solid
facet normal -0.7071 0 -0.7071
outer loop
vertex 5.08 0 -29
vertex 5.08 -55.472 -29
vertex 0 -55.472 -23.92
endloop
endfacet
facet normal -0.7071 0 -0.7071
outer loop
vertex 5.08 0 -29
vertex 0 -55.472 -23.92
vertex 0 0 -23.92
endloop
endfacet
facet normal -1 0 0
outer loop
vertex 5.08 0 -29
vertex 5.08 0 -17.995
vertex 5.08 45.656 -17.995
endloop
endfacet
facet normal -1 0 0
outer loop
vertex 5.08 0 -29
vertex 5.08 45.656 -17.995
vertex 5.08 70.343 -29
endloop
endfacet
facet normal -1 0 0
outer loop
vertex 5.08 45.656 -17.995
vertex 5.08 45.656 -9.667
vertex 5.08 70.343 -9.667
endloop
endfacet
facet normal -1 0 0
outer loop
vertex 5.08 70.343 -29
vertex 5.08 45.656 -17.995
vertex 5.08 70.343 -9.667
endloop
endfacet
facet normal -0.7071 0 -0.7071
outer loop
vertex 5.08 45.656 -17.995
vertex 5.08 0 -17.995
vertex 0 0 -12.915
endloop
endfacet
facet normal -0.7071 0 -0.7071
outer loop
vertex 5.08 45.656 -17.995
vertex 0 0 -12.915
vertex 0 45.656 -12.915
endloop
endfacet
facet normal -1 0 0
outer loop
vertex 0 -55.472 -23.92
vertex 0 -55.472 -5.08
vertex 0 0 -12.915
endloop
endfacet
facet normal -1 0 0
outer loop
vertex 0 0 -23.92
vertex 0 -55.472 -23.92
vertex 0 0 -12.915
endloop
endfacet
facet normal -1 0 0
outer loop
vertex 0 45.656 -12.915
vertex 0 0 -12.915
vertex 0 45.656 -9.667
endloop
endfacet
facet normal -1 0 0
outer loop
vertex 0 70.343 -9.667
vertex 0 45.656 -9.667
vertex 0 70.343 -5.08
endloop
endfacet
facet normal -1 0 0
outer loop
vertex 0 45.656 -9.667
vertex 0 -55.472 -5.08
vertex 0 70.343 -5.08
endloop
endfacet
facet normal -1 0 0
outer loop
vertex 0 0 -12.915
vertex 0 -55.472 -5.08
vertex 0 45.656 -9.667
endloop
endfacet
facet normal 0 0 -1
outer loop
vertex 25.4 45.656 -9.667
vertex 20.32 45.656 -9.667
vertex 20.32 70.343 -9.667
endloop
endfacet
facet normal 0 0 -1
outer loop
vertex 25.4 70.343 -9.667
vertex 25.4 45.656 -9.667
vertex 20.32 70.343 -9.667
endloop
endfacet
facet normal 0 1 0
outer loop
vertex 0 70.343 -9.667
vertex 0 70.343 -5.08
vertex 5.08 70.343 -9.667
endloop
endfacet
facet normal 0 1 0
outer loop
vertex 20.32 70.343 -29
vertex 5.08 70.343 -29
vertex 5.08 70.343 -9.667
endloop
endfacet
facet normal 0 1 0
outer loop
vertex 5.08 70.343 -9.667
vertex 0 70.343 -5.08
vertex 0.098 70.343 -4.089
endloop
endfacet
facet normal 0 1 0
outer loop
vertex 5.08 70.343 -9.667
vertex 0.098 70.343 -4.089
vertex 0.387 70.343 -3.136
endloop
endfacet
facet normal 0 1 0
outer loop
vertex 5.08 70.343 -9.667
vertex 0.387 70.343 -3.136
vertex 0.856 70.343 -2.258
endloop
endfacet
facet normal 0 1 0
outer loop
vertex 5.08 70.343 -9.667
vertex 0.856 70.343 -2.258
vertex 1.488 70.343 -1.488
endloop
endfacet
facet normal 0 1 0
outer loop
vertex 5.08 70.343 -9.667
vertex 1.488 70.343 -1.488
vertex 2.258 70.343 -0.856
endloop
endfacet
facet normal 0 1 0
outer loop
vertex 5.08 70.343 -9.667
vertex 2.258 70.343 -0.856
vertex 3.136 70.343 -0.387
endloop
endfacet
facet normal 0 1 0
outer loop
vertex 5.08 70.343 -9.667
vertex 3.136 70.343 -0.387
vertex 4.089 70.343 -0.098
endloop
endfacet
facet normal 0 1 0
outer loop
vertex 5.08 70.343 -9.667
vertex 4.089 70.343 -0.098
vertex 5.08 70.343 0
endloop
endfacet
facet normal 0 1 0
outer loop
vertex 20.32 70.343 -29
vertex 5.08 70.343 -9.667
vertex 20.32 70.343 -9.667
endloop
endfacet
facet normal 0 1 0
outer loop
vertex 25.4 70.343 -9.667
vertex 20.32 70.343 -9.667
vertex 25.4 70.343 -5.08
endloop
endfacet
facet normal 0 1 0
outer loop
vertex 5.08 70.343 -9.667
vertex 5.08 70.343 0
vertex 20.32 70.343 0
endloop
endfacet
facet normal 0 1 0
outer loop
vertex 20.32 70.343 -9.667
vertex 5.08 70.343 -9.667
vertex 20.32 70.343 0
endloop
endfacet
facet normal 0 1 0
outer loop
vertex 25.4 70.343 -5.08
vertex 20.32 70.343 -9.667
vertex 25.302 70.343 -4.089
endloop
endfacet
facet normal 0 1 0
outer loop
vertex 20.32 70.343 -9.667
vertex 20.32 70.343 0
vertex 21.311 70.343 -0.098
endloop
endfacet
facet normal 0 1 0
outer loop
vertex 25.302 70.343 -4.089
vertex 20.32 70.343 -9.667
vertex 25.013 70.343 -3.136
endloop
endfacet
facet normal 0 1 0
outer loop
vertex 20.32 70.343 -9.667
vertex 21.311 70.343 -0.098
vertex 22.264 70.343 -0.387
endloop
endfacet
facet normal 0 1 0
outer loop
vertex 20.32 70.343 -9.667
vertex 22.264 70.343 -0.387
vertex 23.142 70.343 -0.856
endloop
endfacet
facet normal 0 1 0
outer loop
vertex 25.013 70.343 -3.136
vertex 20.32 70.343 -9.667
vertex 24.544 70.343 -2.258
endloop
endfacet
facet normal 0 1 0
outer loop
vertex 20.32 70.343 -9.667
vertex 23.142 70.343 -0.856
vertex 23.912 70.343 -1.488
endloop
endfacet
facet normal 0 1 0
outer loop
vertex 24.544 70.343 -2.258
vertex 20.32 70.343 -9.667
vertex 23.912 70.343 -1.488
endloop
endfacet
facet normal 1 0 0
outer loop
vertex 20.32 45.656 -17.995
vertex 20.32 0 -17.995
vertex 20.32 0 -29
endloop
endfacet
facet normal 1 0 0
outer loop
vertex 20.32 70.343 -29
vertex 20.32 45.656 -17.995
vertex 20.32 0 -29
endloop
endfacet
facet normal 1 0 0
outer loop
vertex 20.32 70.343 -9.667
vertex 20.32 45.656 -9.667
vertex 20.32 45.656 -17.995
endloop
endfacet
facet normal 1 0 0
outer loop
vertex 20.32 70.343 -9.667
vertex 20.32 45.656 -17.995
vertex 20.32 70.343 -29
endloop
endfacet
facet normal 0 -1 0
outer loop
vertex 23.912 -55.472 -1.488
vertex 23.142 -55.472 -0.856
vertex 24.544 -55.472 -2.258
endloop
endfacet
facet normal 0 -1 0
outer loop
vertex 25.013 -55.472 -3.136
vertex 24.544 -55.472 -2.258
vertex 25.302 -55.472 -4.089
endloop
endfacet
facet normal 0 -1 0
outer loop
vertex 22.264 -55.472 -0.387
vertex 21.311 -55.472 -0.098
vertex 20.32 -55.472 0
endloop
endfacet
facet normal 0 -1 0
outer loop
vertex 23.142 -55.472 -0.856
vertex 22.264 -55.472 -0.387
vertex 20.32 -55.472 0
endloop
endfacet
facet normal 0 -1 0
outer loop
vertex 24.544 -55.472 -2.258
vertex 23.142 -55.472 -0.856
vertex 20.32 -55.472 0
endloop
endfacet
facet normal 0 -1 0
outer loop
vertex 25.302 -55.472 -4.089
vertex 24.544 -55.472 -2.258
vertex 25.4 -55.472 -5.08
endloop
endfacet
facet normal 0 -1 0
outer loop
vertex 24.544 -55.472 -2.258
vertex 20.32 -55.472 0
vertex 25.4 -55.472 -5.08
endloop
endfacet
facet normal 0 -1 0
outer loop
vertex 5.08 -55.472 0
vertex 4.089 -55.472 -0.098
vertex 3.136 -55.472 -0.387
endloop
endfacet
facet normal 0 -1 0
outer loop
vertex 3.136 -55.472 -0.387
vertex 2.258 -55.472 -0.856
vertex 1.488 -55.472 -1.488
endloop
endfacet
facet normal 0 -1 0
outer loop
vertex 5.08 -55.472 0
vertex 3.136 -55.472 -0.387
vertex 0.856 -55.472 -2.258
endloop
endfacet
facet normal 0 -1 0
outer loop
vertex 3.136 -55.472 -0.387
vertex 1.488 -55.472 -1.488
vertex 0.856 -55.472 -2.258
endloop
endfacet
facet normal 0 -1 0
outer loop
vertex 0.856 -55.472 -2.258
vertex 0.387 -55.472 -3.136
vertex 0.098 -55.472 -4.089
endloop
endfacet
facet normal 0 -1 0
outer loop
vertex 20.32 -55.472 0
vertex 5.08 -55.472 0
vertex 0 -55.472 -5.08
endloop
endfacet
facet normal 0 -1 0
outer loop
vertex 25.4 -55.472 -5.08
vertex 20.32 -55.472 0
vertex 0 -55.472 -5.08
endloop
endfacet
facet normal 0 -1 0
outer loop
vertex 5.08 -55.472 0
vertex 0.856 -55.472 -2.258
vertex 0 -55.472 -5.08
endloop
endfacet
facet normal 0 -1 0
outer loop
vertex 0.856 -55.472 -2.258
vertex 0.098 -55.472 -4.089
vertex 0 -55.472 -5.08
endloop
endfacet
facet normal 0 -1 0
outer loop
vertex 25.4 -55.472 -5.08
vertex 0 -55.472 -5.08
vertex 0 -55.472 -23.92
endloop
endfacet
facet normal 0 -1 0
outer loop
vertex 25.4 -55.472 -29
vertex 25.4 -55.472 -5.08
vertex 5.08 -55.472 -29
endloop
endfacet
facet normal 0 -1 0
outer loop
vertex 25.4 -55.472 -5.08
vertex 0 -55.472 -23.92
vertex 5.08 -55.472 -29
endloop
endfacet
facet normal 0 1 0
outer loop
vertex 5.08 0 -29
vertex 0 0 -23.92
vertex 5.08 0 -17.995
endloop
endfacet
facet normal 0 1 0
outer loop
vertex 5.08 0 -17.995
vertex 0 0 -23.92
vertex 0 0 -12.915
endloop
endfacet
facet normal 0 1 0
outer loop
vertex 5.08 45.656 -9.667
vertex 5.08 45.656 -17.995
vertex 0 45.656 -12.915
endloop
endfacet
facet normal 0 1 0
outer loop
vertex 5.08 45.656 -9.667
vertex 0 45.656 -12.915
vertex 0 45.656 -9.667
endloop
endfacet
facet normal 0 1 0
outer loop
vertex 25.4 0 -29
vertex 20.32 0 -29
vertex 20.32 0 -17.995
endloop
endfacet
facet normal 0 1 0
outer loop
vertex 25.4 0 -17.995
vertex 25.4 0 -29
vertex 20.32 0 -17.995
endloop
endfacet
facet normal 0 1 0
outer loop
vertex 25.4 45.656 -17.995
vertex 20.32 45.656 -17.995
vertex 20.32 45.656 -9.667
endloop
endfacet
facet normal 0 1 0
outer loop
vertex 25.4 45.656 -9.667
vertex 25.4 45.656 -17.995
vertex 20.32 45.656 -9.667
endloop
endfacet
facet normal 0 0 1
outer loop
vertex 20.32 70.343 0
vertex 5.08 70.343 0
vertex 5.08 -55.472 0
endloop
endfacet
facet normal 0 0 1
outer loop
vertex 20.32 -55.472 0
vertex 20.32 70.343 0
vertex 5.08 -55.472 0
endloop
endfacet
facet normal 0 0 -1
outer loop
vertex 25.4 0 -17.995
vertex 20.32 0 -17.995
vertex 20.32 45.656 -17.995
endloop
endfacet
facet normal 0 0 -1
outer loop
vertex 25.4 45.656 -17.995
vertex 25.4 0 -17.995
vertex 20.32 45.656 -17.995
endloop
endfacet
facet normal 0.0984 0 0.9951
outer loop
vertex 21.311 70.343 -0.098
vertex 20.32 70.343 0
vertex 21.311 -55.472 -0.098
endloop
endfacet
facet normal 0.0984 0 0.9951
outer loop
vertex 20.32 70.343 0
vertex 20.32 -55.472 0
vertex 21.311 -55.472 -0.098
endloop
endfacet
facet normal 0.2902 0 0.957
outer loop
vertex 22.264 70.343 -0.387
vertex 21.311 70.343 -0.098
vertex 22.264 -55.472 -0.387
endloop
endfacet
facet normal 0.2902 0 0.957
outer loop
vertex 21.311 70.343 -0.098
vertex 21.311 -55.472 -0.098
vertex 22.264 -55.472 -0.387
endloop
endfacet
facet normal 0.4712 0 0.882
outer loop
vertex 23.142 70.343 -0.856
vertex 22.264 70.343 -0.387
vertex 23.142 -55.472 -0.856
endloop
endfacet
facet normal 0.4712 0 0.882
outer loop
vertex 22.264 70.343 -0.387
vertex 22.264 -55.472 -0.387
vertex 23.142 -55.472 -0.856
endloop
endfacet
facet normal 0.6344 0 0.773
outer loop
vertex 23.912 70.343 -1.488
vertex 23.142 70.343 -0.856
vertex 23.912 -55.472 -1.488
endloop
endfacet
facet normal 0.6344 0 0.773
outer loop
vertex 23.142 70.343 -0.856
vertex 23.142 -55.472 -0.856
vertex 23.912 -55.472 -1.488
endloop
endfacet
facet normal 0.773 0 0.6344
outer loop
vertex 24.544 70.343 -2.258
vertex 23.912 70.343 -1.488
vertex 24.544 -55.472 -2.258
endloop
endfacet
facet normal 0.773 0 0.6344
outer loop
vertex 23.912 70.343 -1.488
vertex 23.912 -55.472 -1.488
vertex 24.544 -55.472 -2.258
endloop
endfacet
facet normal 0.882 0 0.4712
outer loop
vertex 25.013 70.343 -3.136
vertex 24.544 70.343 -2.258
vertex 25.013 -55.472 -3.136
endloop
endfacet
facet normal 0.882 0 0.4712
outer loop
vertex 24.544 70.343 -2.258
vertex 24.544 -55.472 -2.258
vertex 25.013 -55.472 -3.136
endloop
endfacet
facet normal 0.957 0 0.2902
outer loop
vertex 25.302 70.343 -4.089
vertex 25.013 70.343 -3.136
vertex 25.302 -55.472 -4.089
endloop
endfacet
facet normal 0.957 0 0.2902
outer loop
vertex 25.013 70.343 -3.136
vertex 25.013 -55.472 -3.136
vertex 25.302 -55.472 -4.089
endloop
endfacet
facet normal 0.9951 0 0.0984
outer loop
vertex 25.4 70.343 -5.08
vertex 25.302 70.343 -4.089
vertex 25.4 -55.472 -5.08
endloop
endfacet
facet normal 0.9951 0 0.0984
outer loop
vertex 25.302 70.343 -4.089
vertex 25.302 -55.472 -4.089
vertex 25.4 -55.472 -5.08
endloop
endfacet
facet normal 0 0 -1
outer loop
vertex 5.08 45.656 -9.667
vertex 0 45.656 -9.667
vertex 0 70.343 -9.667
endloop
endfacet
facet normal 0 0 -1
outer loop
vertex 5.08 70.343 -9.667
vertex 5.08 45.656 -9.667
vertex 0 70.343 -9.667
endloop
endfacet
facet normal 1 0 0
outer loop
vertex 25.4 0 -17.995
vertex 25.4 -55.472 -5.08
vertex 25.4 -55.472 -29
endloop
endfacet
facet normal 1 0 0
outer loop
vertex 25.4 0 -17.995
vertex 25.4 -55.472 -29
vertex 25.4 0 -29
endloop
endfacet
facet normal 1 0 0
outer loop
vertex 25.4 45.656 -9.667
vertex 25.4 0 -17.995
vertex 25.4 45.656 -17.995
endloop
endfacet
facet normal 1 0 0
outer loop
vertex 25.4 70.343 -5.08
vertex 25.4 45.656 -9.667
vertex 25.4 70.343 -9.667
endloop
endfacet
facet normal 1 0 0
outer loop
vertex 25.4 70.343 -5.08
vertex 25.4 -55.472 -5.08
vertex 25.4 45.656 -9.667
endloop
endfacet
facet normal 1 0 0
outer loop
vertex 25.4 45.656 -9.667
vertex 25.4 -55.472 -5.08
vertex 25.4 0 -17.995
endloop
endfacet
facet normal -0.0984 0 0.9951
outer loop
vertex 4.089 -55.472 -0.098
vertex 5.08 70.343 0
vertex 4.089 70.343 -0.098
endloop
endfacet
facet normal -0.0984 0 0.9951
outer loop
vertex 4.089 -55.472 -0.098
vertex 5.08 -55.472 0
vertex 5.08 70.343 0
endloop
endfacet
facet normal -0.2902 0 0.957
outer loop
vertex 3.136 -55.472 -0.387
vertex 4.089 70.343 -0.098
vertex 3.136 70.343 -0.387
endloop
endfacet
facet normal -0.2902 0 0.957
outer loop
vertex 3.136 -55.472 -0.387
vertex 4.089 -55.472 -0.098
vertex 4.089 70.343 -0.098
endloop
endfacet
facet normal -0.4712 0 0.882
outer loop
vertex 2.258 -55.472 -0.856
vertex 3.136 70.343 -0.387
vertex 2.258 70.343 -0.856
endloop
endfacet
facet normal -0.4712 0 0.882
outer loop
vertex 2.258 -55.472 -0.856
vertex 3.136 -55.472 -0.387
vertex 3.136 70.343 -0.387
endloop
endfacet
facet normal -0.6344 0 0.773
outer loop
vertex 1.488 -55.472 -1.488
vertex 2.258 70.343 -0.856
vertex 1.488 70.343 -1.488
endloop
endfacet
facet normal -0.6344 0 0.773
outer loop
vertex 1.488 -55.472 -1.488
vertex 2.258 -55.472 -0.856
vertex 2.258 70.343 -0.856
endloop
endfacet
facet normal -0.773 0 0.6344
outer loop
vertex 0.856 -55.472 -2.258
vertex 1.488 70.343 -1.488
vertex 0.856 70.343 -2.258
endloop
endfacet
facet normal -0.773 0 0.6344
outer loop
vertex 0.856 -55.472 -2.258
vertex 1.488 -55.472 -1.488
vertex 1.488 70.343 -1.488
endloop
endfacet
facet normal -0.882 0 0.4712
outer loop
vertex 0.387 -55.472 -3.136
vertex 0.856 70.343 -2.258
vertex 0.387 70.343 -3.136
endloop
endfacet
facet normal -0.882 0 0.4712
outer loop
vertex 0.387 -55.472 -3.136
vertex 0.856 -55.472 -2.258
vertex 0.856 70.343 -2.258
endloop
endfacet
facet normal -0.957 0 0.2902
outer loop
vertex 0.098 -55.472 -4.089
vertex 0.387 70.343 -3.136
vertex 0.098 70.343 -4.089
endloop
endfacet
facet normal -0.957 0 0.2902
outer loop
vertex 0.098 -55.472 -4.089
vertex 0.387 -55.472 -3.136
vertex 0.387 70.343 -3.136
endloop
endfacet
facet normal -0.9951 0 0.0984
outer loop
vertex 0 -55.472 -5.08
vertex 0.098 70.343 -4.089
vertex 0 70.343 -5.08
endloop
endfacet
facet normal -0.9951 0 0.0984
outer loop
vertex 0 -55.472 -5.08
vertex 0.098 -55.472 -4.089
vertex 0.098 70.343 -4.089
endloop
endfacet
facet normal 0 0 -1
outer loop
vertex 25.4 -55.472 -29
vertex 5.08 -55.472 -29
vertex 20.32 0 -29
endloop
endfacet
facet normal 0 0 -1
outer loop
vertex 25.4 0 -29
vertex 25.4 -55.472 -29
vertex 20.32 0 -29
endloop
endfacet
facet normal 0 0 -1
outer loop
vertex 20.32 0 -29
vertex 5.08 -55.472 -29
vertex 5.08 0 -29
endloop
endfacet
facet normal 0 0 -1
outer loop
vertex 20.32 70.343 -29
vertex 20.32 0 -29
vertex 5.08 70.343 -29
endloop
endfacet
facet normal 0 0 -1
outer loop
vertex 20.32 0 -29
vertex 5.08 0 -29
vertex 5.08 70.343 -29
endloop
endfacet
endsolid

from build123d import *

# Parameters (mm, degrees)
F1_DEPTH  = 25.4
F2_R      = 5.08
F3_R      = 5.08
F4_SIZE   = 5.08
F5_R      = 6.332586
F1_FACE_W = 15.24
F1_FACE_H = 125.814986
F6_DEPTH  = 28.999906


with BuildPart() as f1:
    # F0 (on Right) → F1 (new body)
    with BuildSketch(Plane.YZ):
        Polygon((70.343368, 0), (-55.471618, 0), (-55.471618, -28.999906), (0, -28.999906), (0, -17.994815), (45.656264, -17.994815), (45.656264, -9.666636), (70.343368, -9.666636), align=None)
    extrude(amount=F1_DEPTH)

    # F2
    f2_edges = [f1.edges().sort_by_distance(p)[0] for p in [
        (25.4, 7.435875, 0),
    ]]
    fillet(f2_edges, radius=F2_R)

    # F3
    f3_edges = [f1.edges().sort_by_distance(p)[0] for p in [
        (0, 7.435875, 0),
    ]]
    fillet(f3_edges, radius=F3_R)

    # F4
    f4_edges = [f1.edges().sort_by_distance(p)[0] for p in [
        (0, -27.735809, -28.999906),
        (0, 22.828132, -17.994815),
    ]]
    chamfer(f4_edges, length=F4_SIZE)

    # F5 (on Top) + F1_face (on face) → F6 (join, through all)
    with BuildSketch(Plane.XY):
        with Locations((12.965518, 0)):
            Circle(F5_R)
    with BuildSketch(Plane(origin=(12.7, 7.435875, 0), x_dir=(1, 0, 0), z_dir=(0, 0, 1))):
        Rectangle(F1_FACE_W, F1_FACE_H)
    extrude(amount=-F6_DEPTH)


solid = f1.part
